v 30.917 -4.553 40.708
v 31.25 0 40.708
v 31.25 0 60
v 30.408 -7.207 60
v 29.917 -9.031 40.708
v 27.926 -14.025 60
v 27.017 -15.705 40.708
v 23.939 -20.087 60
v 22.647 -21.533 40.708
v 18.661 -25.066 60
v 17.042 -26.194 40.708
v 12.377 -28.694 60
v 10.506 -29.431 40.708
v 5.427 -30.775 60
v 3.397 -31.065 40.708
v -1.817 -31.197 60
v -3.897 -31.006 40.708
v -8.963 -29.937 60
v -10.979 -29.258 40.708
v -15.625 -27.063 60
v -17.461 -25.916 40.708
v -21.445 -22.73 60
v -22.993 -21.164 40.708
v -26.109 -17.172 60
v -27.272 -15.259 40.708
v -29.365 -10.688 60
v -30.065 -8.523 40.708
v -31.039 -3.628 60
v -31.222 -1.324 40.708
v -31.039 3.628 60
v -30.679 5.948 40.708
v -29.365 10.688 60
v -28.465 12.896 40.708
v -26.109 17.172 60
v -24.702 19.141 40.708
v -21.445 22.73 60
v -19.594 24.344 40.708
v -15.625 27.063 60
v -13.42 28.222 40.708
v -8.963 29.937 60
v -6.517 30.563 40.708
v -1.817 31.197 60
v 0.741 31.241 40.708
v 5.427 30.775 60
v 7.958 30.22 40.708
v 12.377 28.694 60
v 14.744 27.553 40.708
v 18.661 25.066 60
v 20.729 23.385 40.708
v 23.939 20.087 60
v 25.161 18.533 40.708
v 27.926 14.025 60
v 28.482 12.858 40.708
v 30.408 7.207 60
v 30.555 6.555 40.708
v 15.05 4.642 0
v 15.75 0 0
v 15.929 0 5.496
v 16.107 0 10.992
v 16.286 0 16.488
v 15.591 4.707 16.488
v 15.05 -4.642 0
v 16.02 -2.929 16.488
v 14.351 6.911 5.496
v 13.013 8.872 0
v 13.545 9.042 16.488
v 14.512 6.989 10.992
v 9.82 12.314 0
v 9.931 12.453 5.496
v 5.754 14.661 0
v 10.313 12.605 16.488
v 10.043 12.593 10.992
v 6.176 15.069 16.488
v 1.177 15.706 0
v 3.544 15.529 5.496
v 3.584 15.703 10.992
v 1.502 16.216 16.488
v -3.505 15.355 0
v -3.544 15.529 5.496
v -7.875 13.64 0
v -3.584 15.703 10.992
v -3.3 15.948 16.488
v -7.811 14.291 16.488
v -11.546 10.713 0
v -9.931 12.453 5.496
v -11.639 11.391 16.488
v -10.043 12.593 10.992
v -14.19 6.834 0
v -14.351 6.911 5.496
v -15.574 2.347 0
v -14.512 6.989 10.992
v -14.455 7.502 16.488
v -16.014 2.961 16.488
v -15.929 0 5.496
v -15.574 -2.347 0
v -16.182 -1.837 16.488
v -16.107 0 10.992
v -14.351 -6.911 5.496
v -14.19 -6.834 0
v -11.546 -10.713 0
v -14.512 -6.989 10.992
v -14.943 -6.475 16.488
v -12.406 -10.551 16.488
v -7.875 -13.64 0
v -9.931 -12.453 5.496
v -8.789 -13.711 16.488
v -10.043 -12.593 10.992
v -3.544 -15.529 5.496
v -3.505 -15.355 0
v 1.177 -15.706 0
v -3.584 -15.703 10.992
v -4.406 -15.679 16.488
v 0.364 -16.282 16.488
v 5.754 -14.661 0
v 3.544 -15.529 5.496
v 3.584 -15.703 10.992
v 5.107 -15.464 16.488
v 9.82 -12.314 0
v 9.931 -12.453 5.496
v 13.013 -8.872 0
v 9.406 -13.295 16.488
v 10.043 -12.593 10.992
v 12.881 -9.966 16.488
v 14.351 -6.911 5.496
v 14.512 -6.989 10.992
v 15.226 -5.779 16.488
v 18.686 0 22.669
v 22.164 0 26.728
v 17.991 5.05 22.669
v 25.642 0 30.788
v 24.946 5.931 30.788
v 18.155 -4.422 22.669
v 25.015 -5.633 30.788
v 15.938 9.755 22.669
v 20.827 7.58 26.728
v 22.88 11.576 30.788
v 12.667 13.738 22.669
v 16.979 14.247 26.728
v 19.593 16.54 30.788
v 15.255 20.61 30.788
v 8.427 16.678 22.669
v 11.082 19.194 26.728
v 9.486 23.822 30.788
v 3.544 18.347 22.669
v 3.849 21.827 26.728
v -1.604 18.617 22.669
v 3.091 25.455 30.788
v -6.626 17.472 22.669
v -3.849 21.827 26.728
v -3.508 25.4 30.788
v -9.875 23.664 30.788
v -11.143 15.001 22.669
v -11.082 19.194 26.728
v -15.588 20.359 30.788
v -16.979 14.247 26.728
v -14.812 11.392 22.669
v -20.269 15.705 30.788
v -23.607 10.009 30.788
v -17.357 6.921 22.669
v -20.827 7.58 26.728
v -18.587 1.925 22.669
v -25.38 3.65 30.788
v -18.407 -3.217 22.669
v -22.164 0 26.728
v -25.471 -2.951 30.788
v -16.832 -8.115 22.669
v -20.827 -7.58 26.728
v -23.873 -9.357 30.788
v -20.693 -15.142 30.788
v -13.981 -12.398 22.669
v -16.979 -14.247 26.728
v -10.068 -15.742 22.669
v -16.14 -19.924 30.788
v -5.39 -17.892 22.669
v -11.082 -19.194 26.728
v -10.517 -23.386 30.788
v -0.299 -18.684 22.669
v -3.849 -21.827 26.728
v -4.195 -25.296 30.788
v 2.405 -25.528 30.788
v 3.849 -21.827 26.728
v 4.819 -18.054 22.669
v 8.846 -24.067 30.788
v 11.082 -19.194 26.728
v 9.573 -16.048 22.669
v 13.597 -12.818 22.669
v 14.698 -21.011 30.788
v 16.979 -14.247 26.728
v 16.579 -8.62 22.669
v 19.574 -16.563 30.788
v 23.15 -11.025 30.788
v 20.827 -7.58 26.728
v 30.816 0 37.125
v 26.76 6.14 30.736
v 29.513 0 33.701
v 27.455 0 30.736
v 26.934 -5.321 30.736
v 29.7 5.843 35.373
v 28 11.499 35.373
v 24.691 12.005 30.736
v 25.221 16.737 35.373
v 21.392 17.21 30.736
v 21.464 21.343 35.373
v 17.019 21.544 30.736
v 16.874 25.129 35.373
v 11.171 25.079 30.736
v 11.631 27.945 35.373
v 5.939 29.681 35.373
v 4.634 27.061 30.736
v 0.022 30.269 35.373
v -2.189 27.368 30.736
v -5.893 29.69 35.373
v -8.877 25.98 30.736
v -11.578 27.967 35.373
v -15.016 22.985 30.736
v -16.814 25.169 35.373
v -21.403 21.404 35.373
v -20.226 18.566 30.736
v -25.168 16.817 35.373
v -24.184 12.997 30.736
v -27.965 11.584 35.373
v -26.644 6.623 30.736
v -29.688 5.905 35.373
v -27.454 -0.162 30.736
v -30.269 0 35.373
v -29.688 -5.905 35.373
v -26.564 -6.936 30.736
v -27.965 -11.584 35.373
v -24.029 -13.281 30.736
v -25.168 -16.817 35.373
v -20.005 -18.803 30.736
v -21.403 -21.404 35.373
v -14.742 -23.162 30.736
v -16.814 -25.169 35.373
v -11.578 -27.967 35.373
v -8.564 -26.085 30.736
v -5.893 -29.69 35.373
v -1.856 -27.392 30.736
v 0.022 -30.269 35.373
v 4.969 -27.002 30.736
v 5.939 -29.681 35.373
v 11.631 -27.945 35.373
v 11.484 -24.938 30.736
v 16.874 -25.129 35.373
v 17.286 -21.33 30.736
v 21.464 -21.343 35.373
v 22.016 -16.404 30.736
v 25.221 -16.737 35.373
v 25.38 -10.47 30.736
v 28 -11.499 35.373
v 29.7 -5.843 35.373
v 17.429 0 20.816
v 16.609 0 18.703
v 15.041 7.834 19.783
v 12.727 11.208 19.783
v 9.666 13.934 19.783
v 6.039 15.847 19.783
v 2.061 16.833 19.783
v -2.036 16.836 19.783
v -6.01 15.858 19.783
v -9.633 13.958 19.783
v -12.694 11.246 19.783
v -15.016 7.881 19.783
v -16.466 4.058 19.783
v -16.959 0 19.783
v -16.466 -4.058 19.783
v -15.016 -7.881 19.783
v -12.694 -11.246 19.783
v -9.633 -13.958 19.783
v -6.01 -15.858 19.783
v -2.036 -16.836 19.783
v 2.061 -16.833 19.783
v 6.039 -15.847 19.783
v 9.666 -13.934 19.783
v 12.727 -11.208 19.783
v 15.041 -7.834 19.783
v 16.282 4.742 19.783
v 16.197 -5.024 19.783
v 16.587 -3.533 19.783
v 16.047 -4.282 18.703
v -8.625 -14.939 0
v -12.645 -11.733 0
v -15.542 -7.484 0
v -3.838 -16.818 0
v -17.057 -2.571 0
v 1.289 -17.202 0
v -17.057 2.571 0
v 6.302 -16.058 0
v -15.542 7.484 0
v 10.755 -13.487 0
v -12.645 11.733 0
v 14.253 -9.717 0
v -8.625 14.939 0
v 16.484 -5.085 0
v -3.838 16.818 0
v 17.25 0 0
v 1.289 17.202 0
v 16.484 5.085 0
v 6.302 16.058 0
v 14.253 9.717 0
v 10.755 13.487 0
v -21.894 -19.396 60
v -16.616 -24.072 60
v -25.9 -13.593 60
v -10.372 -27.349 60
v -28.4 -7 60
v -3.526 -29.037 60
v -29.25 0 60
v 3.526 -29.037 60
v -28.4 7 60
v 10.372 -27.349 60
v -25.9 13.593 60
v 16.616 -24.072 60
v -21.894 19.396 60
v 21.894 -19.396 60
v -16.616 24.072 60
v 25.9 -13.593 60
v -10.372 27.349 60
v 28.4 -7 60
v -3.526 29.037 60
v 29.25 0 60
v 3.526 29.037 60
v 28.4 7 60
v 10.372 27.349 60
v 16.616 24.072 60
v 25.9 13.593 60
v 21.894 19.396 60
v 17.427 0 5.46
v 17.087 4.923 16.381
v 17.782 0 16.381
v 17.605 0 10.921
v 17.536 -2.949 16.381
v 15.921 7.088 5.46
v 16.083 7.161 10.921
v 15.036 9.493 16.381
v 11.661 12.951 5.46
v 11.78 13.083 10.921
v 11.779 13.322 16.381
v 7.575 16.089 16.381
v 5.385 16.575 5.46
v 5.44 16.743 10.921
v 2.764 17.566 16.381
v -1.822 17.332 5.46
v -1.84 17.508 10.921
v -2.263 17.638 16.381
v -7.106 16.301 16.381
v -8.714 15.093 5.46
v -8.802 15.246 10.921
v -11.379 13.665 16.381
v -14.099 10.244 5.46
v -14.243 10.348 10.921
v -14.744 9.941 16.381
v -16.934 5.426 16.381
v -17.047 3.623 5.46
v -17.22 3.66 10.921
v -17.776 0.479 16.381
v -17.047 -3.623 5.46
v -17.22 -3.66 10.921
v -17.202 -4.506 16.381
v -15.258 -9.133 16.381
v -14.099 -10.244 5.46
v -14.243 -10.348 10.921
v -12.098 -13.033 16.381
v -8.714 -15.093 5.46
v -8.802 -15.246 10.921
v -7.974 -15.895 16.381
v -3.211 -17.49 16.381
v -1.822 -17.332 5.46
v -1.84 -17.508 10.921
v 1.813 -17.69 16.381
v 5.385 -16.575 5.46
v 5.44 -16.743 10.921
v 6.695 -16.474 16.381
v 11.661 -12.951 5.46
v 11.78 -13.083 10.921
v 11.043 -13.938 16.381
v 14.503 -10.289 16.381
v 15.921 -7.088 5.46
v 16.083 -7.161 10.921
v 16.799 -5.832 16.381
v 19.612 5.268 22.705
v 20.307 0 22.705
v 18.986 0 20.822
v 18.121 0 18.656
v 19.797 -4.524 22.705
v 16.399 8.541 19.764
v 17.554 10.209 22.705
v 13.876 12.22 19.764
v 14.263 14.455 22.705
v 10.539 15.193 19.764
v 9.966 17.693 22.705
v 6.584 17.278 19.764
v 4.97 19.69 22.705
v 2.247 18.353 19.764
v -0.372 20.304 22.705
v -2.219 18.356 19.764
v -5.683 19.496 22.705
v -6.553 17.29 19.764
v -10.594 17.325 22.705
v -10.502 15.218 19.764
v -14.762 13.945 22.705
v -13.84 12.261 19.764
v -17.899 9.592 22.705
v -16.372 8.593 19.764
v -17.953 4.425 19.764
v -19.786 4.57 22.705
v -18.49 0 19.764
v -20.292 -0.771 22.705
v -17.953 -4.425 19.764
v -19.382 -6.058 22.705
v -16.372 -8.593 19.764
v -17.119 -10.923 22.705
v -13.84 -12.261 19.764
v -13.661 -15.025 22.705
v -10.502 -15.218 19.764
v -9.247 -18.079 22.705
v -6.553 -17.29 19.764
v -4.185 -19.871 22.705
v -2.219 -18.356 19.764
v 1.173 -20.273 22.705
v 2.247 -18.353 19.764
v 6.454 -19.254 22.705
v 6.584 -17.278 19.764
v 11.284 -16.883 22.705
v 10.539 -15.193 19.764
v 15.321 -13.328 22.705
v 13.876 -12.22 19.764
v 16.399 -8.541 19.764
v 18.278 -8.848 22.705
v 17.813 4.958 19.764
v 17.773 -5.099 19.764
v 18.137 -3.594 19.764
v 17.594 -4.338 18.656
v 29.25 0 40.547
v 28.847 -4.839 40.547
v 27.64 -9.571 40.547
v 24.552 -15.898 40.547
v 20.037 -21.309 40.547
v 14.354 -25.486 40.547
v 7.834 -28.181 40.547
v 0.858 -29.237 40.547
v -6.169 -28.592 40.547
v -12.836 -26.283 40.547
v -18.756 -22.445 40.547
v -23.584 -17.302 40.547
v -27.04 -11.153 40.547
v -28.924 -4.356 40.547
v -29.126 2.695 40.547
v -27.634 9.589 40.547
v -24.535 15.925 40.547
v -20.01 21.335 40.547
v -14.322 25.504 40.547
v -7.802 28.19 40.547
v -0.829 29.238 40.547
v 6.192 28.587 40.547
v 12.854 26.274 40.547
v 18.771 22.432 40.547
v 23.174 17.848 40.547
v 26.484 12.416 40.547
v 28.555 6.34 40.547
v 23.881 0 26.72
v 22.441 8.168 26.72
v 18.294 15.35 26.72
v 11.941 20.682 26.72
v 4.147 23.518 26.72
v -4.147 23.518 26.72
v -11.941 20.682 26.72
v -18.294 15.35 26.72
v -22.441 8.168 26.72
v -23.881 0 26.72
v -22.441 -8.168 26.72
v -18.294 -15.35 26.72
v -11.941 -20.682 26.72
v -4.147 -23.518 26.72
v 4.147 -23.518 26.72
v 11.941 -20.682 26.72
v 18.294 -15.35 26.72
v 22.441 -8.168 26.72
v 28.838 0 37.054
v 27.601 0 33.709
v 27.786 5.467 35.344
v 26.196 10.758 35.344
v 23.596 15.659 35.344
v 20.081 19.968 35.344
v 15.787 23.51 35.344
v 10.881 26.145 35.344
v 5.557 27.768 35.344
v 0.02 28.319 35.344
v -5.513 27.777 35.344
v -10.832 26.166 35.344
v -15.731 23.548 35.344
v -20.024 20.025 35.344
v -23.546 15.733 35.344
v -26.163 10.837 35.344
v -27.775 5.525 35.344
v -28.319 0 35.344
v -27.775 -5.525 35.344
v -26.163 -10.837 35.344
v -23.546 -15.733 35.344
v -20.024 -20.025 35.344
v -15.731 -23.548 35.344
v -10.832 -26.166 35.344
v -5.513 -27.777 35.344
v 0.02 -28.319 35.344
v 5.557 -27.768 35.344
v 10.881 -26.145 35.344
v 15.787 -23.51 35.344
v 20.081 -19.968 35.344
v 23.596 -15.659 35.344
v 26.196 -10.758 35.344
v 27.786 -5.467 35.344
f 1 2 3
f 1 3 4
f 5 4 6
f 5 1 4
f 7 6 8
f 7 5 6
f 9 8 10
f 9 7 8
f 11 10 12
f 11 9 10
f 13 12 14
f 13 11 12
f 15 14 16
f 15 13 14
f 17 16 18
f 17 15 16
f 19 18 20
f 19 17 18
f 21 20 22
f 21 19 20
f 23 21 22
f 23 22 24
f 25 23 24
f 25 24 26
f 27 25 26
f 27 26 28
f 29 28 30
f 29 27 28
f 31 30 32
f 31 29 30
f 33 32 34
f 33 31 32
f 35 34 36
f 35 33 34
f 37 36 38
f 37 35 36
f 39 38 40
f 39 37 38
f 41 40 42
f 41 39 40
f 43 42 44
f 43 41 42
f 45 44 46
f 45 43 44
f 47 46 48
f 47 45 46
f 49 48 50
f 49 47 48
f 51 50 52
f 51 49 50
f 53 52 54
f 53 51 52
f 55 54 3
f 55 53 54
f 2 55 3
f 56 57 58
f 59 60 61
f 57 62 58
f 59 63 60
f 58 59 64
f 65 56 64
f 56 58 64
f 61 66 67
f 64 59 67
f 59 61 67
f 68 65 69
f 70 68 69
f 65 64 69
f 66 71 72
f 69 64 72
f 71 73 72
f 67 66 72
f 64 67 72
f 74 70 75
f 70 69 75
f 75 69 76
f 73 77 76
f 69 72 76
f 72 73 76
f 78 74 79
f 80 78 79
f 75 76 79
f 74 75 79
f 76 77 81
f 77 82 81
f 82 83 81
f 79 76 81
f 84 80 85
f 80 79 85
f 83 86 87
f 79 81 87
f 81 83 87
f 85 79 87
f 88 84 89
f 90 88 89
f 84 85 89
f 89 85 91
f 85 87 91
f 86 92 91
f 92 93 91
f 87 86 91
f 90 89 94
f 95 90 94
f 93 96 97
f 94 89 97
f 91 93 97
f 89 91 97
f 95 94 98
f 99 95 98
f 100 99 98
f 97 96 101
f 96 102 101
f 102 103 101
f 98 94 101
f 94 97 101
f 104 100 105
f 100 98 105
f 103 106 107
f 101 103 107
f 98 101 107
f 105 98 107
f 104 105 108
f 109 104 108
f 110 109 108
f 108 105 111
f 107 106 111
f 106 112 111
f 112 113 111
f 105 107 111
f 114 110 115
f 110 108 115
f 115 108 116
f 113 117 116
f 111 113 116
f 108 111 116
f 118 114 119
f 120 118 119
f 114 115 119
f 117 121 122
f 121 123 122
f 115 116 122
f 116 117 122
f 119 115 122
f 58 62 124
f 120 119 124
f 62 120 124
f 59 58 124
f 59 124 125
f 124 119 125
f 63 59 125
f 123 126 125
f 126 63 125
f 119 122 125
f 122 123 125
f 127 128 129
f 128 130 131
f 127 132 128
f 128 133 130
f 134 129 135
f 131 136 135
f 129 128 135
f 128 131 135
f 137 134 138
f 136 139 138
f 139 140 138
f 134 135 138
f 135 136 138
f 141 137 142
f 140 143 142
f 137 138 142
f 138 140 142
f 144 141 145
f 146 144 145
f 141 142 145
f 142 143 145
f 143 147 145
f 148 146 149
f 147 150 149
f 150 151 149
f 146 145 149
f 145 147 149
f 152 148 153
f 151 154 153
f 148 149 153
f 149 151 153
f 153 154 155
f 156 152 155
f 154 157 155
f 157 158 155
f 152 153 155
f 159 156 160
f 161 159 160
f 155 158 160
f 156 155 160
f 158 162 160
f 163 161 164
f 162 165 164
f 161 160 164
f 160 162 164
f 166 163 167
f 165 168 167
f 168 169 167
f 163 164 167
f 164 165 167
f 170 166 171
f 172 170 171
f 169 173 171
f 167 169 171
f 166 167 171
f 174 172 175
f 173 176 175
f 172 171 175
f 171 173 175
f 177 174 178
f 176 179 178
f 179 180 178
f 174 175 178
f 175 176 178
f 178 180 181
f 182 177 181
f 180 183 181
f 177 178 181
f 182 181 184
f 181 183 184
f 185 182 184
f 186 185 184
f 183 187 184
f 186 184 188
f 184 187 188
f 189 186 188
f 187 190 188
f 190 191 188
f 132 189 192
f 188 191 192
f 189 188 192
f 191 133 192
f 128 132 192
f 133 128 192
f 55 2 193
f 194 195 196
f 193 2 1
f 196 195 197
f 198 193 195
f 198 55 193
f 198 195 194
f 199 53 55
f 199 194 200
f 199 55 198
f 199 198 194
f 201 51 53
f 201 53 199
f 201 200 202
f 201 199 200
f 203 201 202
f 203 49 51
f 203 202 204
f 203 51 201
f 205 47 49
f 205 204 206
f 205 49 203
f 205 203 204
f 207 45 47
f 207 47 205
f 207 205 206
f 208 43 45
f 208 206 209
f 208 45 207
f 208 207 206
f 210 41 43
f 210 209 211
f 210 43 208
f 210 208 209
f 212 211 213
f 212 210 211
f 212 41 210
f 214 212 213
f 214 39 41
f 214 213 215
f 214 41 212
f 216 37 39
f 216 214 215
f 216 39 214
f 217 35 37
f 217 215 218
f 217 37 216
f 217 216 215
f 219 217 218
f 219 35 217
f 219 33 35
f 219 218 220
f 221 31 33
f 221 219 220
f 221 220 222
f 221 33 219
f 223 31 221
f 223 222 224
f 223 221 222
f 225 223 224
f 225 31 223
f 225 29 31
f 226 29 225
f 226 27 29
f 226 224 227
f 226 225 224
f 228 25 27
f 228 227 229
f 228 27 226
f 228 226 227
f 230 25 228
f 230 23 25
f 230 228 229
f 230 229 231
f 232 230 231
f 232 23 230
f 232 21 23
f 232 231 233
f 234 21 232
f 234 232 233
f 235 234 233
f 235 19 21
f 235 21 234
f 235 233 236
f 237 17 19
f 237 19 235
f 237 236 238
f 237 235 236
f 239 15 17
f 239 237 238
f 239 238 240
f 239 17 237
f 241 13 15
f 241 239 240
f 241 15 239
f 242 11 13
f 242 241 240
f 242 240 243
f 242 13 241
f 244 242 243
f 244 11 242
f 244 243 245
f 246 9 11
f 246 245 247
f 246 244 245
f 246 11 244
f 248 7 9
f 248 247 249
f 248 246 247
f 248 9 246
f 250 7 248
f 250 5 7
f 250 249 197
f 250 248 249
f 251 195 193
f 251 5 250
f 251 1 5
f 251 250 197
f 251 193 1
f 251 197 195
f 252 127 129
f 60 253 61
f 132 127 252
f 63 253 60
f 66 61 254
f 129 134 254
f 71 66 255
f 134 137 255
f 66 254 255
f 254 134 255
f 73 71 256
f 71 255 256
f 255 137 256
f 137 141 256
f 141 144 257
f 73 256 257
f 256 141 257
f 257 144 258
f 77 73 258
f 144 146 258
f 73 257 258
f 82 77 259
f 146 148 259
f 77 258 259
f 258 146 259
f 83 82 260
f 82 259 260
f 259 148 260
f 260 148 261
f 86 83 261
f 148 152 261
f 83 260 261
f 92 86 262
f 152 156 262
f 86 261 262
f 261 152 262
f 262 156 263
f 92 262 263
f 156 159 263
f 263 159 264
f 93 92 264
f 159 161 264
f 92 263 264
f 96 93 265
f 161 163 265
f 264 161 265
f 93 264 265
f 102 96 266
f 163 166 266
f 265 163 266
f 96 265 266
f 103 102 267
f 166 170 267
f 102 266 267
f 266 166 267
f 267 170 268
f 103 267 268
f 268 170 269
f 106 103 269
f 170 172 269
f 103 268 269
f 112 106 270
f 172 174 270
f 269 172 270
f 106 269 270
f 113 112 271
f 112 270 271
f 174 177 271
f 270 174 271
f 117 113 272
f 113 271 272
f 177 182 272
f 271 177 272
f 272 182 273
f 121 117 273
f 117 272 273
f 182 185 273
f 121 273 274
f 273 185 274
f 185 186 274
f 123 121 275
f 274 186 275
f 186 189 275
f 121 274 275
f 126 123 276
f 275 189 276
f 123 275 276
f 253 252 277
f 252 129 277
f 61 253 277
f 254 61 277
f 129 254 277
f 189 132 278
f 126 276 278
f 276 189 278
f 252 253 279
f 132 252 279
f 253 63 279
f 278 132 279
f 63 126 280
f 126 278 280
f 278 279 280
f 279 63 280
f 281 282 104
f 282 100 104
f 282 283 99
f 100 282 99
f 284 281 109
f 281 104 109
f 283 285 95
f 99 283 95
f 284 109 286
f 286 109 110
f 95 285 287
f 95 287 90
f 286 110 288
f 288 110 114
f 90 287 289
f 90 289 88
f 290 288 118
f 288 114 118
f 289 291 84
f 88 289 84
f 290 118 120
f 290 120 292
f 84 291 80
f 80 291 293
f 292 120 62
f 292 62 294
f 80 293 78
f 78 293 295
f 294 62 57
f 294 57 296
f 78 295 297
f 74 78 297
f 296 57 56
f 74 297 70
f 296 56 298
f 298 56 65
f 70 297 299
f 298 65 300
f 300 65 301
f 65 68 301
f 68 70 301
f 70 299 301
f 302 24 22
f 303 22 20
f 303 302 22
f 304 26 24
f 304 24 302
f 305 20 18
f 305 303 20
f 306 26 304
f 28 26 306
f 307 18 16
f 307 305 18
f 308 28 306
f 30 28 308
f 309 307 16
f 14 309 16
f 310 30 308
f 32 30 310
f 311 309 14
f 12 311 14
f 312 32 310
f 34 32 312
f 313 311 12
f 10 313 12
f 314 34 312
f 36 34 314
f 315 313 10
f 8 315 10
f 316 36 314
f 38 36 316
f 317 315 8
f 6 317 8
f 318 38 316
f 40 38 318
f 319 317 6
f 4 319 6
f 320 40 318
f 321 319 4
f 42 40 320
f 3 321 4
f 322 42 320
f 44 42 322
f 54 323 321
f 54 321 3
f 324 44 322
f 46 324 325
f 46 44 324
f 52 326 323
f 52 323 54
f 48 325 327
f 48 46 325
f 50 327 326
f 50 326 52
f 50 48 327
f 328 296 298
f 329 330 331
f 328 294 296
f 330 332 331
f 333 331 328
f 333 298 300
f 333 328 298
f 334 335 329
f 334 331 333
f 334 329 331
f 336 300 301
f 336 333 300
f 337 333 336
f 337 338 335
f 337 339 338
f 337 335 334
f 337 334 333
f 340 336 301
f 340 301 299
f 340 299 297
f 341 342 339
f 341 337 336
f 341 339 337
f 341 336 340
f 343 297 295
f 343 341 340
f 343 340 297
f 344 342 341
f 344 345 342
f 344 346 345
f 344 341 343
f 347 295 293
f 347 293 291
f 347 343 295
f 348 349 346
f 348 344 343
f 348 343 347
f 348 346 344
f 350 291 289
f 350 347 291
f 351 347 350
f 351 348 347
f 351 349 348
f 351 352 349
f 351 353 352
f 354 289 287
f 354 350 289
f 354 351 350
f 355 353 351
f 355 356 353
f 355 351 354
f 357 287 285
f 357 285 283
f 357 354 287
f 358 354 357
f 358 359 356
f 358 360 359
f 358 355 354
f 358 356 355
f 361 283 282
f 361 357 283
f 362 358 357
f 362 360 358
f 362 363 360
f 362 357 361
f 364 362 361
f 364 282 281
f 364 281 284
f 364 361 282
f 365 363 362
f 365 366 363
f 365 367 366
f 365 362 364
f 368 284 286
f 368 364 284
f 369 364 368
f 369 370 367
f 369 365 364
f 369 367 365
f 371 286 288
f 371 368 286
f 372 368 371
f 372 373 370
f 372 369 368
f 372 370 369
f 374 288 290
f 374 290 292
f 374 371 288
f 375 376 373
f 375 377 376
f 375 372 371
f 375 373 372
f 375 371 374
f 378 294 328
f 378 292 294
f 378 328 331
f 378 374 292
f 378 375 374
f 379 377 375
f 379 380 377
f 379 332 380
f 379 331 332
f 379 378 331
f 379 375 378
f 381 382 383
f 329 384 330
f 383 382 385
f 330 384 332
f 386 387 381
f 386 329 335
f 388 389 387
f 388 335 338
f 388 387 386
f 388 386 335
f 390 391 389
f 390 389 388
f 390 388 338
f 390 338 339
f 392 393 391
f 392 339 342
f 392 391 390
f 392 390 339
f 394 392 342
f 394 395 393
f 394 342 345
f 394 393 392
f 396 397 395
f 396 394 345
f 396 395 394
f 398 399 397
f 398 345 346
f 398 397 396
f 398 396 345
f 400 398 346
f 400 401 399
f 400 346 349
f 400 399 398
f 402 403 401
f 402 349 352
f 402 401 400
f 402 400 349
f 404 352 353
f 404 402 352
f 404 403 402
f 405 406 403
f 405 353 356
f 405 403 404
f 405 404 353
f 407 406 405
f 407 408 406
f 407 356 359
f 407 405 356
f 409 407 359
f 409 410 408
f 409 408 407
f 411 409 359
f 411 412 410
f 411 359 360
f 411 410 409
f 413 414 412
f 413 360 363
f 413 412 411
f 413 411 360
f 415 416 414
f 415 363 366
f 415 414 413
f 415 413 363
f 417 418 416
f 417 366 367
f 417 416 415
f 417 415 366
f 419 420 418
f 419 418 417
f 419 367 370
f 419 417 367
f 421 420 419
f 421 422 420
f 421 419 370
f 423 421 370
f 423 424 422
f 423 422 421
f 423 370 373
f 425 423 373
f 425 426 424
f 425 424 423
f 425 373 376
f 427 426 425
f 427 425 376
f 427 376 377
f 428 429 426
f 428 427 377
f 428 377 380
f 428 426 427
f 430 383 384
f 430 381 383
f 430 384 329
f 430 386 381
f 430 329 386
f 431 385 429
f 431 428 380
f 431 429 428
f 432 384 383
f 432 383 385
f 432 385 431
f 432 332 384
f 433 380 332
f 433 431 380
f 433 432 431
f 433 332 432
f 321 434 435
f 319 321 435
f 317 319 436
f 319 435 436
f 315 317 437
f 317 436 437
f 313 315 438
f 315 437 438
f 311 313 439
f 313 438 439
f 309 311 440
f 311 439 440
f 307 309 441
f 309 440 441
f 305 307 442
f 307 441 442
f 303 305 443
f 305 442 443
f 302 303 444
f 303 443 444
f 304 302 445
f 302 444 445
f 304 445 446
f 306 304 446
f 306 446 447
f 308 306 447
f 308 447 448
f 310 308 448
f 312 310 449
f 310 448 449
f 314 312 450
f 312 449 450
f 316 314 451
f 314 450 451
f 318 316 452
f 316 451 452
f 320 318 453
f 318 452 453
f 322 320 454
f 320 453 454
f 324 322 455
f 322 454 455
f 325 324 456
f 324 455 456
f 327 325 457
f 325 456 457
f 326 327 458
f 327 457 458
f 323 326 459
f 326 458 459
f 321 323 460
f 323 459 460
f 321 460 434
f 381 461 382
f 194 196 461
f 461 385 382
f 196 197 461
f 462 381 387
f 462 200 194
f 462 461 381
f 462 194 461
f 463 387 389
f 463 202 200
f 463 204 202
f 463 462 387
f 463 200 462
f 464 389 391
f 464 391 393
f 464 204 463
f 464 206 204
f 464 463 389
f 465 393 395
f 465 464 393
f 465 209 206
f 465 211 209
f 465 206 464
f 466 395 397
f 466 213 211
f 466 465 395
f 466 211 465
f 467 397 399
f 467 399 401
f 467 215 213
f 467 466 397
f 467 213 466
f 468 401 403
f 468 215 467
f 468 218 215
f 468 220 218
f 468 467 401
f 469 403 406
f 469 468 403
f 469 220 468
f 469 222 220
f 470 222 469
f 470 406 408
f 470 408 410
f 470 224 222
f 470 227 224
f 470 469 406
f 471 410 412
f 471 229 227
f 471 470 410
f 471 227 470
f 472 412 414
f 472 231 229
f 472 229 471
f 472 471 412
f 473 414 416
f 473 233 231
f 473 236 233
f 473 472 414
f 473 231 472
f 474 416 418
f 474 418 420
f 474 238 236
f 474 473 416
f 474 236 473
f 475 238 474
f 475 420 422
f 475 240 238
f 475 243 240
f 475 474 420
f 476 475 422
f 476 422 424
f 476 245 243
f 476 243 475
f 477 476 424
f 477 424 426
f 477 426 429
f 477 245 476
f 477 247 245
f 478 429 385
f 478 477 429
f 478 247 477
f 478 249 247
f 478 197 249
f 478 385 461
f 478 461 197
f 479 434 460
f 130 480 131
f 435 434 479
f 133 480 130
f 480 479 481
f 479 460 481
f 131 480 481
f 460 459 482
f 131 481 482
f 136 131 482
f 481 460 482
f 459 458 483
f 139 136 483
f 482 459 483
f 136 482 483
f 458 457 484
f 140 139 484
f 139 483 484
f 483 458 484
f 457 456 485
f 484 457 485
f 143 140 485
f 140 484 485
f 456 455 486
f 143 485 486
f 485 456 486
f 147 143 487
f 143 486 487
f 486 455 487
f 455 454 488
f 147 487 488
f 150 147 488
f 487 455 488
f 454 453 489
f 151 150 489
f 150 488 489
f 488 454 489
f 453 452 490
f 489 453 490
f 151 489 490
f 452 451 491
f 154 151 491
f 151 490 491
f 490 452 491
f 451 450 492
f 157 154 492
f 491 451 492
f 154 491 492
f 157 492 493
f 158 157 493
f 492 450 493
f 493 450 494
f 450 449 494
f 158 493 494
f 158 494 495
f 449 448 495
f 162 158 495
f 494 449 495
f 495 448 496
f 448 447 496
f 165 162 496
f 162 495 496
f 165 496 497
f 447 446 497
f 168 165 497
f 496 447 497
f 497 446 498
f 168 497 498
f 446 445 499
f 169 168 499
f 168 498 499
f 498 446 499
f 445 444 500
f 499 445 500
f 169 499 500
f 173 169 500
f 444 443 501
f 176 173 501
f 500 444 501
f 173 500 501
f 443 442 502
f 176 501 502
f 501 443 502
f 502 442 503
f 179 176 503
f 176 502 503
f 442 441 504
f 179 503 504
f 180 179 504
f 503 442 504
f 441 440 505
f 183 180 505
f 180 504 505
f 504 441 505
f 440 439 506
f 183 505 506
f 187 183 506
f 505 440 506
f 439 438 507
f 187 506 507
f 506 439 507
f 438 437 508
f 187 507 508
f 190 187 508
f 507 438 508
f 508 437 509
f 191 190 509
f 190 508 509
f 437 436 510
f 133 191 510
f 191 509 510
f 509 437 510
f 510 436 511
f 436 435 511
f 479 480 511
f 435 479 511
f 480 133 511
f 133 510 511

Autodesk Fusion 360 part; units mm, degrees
sketch "Sketch1" plane through (0, 0, 0) normal (0, 0, 1) x (1, 0, 0)
  circle A0 centre (0, 0) radius 17.25
  circle A1 centre (0, 0) radius 15.75
  dimension "d1" = 34.5
  dimension "d4" = -1.5
ref_plane "WorkPlane1" through (0, 0, 20) normal (0, 0, 1) x (1, 0, 0)
sketch "Sketch2" plane through (0, 0, 20) normal (0, 0, 1) x (1, 0, 0)
  circle A0 centre (0, 0) radius 17.9
  circle A1 centre (0, 0) radius 16.4
  dimension "d3" = 35.8
  dimension "d5" = -1.5
ref_plane "WorkPlane2" through (0, 0, 35) normal (0, 0, 1) x (1, 0, 0)
sketch "Sketch3" plane through (0, 0, 35) normal (0, 0, 1) x (1, 0, 0)
  circle A0 centre (0, 0) radius 29.25
  circle A1 centre (0, 0) radius 31.25
  dimension "d7" = 58.5
  dimension "d8" = 2
loft "Loft1" add profiles "Sketch3", "Sketch2" section 1 section 2
loft "Loft2" cut profiles "Sketch3", "Sketch2" section 1 contours A0 section 2 contours A1
loft "Loft3" add profiles "Sketch2", "Sketch1" section 1 section 2
loft "Loft4" cut profiles "Sketch1", "Sketch2" section 1 contours A1 section 2 contours A1
extrude "Extrude1" add sketch "Sketch3" along normal blind 25
fillet "Fillet1" radius 15 2 edges at (-27.2706, 10.5773, 35) (-29.1352, 11.3005, 35)
fillet "Fillet2" radius 10 2 edges at (-16.6887, -6.4729, 20) (-15.2902, -5.9305, 20)
equation "d5 = d4"
